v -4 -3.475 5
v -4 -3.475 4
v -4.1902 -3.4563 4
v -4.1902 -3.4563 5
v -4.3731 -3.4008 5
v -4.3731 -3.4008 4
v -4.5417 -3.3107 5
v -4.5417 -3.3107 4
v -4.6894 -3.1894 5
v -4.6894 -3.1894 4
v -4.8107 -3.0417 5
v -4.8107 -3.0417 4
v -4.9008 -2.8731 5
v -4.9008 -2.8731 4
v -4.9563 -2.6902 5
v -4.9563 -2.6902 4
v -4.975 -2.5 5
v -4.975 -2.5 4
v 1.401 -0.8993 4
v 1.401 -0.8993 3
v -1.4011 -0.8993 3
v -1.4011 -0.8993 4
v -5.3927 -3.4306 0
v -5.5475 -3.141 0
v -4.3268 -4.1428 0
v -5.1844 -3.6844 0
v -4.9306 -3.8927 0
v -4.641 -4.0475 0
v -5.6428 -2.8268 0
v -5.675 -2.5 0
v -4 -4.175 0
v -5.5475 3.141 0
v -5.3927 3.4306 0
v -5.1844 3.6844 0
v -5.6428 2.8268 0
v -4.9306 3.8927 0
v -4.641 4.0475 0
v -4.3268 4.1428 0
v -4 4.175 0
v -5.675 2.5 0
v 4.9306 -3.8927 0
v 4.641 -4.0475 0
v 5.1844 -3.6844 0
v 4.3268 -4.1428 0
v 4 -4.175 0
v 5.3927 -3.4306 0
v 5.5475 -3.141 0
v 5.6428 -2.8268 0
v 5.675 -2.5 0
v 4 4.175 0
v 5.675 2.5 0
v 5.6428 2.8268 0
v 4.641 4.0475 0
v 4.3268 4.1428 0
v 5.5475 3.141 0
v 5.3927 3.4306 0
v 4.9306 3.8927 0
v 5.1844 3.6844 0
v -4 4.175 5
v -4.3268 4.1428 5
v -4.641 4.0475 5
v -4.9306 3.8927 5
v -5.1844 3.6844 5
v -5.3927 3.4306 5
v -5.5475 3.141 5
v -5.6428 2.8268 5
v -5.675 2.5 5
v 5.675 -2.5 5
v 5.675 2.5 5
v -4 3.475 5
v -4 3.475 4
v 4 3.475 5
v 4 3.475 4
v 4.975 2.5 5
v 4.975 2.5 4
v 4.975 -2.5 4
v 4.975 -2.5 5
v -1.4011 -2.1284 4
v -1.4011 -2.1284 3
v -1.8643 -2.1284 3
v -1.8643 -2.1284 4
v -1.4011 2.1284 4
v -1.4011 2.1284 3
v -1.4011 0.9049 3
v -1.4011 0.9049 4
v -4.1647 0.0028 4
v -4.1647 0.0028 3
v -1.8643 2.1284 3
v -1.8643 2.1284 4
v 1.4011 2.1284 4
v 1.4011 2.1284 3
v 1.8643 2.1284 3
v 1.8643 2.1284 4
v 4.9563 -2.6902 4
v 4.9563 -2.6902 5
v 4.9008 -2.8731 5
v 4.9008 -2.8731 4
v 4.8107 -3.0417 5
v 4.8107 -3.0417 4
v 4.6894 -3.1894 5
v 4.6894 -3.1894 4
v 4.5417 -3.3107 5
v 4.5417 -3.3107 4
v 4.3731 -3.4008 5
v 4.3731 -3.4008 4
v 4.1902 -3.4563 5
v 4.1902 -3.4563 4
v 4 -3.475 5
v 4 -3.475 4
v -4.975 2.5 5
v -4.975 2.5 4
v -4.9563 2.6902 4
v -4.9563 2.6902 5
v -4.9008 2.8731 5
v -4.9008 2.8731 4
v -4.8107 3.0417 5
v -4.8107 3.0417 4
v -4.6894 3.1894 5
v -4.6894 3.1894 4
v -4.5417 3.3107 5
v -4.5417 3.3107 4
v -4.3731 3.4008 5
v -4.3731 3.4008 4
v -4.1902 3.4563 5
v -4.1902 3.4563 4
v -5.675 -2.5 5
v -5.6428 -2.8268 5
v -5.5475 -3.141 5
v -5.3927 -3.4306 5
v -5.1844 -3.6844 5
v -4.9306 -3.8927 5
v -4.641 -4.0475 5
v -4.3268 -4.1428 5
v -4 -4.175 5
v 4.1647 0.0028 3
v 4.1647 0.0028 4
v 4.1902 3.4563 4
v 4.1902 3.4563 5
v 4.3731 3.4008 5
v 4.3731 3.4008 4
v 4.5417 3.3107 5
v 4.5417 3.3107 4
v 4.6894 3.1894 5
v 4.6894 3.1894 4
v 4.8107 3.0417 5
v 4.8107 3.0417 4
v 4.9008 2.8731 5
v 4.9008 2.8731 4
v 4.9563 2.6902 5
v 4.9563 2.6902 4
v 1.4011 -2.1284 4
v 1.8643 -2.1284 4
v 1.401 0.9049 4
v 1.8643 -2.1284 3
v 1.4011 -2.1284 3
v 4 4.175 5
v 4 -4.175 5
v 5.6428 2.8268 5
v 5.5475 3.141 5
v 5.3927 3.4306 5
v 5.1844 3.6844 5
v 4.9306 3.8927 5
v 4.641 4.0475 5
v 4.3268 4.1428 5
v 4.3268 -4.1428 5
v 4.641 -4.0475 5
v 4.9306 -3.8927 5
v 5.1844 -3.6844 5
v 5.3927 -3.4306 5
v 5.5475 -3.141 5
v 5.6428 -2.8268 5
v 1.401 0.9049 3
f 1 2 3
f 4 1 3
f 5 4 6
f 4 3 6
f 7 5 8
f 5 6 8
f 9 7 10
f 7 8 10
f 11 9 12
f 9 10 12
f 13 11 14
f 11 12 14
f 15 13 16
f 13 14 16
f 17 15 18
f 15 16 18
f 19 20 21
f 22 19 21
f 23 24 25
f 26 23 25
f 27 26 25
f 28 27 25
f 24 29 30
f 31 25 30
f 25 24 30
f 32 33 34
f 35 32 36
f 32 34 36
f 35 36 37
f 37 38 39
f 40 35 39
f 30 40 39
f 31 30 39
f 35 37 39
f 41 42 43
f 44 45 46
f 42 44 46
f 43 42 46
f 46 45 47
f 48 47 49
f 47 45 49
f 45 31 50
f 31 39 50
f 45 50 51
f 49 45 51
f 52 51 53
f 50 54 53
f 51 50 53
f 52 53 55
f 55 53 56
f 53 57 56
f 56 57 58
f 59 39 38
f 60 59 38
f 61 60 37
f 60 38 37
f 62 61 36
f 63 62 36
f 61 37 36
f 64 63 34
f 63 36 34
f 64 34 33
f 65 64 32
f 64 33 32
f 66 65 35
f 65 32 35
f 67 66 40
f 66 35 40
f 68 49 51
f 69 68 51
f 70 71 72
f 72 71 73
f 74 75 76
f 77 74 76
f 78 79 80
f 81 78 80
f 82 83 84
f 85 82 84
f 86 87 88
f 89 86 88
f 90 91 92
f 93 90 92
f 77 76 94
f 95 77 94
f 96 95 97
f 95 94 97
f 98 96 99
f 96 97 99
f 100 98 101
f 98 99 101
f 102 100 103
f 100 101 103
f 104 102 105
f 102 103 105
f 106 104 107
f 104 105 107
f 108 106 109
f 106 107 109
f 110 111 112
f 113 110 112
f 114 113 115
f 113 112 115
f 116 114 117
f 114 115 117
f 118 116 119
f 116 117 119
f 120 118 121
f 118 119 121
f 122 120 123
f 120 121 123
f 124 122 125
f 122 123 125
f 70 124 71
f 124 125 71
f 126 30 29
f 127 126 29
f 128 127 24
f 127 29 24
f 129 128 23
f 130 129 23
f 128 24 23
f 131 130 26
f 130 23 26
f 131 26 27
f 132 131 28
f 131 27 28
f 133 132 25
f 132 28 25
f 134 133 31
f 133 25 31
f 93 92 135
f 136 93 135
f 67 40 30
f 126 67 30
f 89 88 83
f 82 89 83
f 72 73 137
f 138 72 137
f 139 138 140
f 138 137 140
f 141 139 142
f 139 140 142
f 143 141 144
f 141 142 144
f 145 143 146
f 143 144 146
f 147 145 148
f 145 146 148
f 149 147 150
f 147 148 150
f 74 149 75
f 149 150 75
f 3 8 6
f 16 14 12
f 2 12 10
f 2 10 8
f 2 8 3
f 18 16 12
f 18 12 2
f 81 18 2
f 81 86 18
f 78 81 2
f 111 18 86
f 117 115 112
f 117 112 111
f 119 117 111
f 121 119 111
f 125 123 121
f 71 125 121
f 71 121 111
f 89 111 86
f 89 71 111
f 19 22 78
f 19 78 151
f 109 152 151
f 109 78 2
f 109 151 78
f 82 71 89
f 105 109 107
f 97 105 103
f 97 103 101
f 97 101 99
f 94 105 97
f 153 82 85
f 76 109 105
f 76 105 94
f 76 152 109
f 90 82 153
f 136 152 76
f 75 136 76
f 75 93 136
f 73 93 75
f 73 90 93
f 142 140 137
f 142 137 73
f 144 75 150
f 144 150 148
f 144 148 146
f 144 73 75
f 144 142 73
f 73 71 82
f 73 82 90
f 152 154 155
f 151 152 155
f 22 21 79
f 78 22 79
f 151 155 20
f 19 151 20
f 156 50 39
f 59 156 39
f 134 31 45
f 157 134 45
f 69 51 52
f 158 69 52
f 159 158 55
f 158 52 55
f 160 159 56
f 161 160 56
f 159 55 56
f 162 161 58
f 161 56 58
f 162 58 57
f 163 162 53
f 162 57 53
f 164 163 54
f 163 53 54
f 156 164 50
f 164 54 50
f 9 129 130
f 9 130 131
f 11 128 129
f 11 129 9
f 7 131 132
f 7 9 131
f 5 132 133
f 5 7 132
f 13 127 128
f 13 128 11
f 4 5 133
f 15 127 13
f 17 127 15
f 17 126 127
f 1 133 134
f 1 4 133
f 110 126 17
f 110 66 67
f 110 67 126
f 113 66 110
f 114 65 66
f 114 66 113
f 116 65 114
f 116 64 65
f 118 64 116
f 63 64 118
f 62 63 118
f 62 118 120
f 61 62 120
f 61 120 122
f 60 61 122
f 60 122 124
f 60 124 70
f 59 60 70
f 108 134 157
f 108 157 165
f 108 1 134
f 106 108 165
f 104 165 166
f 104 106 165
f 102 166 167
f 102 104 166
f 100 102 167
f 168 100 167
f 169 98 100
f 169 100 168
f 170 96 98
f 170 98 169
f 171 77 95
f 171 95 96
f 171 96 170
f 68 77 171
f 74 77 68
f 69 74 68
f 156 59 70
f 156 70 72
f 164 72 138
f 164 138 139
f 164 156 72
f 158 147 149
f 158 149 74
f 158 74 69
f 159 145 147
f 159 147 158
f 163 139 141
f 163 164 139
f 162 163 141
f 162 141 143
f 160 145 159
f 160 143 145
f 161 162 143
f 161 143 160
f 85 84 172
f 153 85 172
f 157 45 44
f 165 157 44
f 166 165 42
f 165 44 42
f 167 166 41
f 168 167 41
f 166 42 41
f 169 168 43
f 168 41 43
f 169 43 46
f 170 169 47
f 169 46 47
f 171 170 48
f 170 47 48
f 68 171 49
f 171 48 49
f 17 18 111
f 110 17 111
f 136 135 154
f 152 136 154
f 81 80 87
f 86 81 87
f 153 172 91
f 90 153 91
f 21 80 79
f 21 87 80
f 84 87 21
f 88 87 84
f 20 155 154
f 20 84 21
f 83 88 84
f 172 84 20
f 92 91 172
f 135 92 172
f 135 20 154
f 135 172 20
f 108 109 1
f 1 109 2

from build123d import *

# Parameters (mm, degrees)
F1_DEPTH = 5
F2_DEPTH = 4
F3_DEPTH = 3


with BuildPart() as f1:
    # F0 (on Top) → F1 (new body)
    with BuildSketch(Plane.XY):
        with BuildLine():
            Line((-4, -4.175), (4, -4.175))
            ThreePointArc((4, -4.175), (5.184404, -3.684404), (5.675, -2.5))
            Line((5.675, -2.5), (5.675, 2.5))
            ThreePointArc((5.675, 2.5), (5.184404, 3.684404), (4, 4.175))
            Line((4, 4.175), (-4, 4.175))
            ThreePointArc((-4, 4.175), (-5.184404, 3.684404), (-5.675, 2.5))
            Line((-5.675, 2.5), (-5.675, -2.5))
            ThreePointArc((-5.675, -2.5), (-5.184404, -3.684404), (-4, -4.175))
        make_face()
        with BuildLine():
            ThreePointArc((4.975, -2.5), (4.689429, -3.189429), (4, -3.475))
            Line((4, -3.475), (-4, -3.475))
            ThreePointArc((-4, -3.475), (-4.689429, -3.189429), (-4.975, -2.5))
            Line((-4.975, -2.5), (-4.975, 2.5))
            ThreePointArc((-4.975, 2.5), (-4.689429, 3.189429), (-4, 3.475))
            Line((-4, 3.475), (4, 3.475))
            ThreePointArc((4, 3.475), (4.689429, 3.189429), (4.975, 2.5))
            Line((4.975, 2.5), (4.975, -2.5))
        make_face(mode=Mode.SUBTRACT)
    extrude(amount=F1_DEPTH)

    # F0 (on Top) → F2 (join)
    with BuildSketch(Plane.XY):
        with BuildLine():
            Line((-4, -3.475), (4, -3.475))
            ThreePointArc((4, -3.475), (4.689429, -3.189429), (4.975, -2.5))
            Line((4.975, -2.5), (4.975, 2.5))
            ThreePointArc((4.975, 2.5), (4.689429, 3.189429), (4, 3.475))
            Line((4, 3.475), (-4, 3.475))
            ThreePointArc((-4, 3.475), (-4.689429, 3.189429), (-4.975, 2.5))
            Line((-4.975, 2.5), (-4.975, -2.5))
            ThreePointArc((-4.975, -2.5), (-4.689429, -3.189429), (-4, -3.475))
        make_face()
        Polygon((-1.401109, -0.899309), (-1.401059, -2.128437), (-1.864276, -2.128437), (-4.164679, 0.002819), (-1.864276, 2.128437), (-1.401059, 2.128437), (-1.401109, 0.904921), (1.401021, 0.904921), (1.401059, 2.128437), (1.864276, 2.128437), (4.164679, 0.002819), (1.864276, -2.128437), (1.401059, -2.128437), (1.40102, -0.899309), align=None, mode=Mode.SUBTRACT)
    extrude(amount=F2_DEPTH)

    # F0 (on Top) → F3 (join)
    with BuildSketch(Plane.XY):
        Polygon((-1.864276, -2.128437), (-1.401059, -2.128437), (-1.401109, -0.899309), (1.40102, -0.899309), (1.401059, -2.128437), (1.864276, -2.128437), (4.164679, 0.002819), (1.864276, 2.128437), (1.401059, 2.128437), (1.401021, 0.904921), (-1.401109, 0.904921), (-1.401059, 2.128437), (-1.864276, 2.128437), (-4.164679, 0.002819), align=None)
    extrude(amount=F3_DEPTH)


solid = f1.part
